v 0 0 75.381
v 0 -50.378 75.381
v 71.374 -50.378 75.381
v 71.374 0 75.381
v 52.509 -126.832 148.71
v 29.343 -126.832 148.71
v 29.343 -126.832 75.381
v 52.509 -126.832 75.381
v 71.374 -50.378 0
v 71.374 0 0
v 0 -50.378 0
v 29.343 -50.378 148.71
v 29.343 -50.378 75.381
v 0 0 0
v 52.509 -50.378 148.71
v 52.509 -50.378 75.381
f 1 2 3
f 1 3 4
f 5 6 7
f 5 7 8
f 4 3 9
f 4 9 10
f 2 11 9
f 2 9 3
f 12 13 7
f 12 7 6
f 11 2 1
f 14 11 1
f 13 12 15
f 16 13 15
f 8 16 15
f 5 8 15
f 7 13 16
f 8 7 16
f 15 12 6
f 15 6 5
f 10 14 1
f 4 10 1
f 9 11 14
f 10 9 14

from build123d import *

# Parameters (mm, degrees)
F0_W     = 50.377898
F0_H     = 75.38107
F1_DEPTH = 71.374
F2_W     = 23.165593
F2_H     = 73.32933
F3_DEPTH = 76.454


with BuildPart() as f1:
    # F0 (on Right) → F1 (new body)
    with BuildSketch(Plane.YZ):
        with Locations((-25.188949, 37.690535)):
            Rectangle(F0_W, F0_H)
    extrude(amount=F1_DEPTH)


with BuildPart() as f3:
    # F2 (on face) → F3 (new body)
    with BuildSketch(Plane.XZ.offset(50.377898)):
        with Locations((40.925881, 112.045735)):
            Rectangle(F2_W, F2_H)
    extrude(amount=F3_DEPTH)


solid = Compound([f1.part, f3.part])
